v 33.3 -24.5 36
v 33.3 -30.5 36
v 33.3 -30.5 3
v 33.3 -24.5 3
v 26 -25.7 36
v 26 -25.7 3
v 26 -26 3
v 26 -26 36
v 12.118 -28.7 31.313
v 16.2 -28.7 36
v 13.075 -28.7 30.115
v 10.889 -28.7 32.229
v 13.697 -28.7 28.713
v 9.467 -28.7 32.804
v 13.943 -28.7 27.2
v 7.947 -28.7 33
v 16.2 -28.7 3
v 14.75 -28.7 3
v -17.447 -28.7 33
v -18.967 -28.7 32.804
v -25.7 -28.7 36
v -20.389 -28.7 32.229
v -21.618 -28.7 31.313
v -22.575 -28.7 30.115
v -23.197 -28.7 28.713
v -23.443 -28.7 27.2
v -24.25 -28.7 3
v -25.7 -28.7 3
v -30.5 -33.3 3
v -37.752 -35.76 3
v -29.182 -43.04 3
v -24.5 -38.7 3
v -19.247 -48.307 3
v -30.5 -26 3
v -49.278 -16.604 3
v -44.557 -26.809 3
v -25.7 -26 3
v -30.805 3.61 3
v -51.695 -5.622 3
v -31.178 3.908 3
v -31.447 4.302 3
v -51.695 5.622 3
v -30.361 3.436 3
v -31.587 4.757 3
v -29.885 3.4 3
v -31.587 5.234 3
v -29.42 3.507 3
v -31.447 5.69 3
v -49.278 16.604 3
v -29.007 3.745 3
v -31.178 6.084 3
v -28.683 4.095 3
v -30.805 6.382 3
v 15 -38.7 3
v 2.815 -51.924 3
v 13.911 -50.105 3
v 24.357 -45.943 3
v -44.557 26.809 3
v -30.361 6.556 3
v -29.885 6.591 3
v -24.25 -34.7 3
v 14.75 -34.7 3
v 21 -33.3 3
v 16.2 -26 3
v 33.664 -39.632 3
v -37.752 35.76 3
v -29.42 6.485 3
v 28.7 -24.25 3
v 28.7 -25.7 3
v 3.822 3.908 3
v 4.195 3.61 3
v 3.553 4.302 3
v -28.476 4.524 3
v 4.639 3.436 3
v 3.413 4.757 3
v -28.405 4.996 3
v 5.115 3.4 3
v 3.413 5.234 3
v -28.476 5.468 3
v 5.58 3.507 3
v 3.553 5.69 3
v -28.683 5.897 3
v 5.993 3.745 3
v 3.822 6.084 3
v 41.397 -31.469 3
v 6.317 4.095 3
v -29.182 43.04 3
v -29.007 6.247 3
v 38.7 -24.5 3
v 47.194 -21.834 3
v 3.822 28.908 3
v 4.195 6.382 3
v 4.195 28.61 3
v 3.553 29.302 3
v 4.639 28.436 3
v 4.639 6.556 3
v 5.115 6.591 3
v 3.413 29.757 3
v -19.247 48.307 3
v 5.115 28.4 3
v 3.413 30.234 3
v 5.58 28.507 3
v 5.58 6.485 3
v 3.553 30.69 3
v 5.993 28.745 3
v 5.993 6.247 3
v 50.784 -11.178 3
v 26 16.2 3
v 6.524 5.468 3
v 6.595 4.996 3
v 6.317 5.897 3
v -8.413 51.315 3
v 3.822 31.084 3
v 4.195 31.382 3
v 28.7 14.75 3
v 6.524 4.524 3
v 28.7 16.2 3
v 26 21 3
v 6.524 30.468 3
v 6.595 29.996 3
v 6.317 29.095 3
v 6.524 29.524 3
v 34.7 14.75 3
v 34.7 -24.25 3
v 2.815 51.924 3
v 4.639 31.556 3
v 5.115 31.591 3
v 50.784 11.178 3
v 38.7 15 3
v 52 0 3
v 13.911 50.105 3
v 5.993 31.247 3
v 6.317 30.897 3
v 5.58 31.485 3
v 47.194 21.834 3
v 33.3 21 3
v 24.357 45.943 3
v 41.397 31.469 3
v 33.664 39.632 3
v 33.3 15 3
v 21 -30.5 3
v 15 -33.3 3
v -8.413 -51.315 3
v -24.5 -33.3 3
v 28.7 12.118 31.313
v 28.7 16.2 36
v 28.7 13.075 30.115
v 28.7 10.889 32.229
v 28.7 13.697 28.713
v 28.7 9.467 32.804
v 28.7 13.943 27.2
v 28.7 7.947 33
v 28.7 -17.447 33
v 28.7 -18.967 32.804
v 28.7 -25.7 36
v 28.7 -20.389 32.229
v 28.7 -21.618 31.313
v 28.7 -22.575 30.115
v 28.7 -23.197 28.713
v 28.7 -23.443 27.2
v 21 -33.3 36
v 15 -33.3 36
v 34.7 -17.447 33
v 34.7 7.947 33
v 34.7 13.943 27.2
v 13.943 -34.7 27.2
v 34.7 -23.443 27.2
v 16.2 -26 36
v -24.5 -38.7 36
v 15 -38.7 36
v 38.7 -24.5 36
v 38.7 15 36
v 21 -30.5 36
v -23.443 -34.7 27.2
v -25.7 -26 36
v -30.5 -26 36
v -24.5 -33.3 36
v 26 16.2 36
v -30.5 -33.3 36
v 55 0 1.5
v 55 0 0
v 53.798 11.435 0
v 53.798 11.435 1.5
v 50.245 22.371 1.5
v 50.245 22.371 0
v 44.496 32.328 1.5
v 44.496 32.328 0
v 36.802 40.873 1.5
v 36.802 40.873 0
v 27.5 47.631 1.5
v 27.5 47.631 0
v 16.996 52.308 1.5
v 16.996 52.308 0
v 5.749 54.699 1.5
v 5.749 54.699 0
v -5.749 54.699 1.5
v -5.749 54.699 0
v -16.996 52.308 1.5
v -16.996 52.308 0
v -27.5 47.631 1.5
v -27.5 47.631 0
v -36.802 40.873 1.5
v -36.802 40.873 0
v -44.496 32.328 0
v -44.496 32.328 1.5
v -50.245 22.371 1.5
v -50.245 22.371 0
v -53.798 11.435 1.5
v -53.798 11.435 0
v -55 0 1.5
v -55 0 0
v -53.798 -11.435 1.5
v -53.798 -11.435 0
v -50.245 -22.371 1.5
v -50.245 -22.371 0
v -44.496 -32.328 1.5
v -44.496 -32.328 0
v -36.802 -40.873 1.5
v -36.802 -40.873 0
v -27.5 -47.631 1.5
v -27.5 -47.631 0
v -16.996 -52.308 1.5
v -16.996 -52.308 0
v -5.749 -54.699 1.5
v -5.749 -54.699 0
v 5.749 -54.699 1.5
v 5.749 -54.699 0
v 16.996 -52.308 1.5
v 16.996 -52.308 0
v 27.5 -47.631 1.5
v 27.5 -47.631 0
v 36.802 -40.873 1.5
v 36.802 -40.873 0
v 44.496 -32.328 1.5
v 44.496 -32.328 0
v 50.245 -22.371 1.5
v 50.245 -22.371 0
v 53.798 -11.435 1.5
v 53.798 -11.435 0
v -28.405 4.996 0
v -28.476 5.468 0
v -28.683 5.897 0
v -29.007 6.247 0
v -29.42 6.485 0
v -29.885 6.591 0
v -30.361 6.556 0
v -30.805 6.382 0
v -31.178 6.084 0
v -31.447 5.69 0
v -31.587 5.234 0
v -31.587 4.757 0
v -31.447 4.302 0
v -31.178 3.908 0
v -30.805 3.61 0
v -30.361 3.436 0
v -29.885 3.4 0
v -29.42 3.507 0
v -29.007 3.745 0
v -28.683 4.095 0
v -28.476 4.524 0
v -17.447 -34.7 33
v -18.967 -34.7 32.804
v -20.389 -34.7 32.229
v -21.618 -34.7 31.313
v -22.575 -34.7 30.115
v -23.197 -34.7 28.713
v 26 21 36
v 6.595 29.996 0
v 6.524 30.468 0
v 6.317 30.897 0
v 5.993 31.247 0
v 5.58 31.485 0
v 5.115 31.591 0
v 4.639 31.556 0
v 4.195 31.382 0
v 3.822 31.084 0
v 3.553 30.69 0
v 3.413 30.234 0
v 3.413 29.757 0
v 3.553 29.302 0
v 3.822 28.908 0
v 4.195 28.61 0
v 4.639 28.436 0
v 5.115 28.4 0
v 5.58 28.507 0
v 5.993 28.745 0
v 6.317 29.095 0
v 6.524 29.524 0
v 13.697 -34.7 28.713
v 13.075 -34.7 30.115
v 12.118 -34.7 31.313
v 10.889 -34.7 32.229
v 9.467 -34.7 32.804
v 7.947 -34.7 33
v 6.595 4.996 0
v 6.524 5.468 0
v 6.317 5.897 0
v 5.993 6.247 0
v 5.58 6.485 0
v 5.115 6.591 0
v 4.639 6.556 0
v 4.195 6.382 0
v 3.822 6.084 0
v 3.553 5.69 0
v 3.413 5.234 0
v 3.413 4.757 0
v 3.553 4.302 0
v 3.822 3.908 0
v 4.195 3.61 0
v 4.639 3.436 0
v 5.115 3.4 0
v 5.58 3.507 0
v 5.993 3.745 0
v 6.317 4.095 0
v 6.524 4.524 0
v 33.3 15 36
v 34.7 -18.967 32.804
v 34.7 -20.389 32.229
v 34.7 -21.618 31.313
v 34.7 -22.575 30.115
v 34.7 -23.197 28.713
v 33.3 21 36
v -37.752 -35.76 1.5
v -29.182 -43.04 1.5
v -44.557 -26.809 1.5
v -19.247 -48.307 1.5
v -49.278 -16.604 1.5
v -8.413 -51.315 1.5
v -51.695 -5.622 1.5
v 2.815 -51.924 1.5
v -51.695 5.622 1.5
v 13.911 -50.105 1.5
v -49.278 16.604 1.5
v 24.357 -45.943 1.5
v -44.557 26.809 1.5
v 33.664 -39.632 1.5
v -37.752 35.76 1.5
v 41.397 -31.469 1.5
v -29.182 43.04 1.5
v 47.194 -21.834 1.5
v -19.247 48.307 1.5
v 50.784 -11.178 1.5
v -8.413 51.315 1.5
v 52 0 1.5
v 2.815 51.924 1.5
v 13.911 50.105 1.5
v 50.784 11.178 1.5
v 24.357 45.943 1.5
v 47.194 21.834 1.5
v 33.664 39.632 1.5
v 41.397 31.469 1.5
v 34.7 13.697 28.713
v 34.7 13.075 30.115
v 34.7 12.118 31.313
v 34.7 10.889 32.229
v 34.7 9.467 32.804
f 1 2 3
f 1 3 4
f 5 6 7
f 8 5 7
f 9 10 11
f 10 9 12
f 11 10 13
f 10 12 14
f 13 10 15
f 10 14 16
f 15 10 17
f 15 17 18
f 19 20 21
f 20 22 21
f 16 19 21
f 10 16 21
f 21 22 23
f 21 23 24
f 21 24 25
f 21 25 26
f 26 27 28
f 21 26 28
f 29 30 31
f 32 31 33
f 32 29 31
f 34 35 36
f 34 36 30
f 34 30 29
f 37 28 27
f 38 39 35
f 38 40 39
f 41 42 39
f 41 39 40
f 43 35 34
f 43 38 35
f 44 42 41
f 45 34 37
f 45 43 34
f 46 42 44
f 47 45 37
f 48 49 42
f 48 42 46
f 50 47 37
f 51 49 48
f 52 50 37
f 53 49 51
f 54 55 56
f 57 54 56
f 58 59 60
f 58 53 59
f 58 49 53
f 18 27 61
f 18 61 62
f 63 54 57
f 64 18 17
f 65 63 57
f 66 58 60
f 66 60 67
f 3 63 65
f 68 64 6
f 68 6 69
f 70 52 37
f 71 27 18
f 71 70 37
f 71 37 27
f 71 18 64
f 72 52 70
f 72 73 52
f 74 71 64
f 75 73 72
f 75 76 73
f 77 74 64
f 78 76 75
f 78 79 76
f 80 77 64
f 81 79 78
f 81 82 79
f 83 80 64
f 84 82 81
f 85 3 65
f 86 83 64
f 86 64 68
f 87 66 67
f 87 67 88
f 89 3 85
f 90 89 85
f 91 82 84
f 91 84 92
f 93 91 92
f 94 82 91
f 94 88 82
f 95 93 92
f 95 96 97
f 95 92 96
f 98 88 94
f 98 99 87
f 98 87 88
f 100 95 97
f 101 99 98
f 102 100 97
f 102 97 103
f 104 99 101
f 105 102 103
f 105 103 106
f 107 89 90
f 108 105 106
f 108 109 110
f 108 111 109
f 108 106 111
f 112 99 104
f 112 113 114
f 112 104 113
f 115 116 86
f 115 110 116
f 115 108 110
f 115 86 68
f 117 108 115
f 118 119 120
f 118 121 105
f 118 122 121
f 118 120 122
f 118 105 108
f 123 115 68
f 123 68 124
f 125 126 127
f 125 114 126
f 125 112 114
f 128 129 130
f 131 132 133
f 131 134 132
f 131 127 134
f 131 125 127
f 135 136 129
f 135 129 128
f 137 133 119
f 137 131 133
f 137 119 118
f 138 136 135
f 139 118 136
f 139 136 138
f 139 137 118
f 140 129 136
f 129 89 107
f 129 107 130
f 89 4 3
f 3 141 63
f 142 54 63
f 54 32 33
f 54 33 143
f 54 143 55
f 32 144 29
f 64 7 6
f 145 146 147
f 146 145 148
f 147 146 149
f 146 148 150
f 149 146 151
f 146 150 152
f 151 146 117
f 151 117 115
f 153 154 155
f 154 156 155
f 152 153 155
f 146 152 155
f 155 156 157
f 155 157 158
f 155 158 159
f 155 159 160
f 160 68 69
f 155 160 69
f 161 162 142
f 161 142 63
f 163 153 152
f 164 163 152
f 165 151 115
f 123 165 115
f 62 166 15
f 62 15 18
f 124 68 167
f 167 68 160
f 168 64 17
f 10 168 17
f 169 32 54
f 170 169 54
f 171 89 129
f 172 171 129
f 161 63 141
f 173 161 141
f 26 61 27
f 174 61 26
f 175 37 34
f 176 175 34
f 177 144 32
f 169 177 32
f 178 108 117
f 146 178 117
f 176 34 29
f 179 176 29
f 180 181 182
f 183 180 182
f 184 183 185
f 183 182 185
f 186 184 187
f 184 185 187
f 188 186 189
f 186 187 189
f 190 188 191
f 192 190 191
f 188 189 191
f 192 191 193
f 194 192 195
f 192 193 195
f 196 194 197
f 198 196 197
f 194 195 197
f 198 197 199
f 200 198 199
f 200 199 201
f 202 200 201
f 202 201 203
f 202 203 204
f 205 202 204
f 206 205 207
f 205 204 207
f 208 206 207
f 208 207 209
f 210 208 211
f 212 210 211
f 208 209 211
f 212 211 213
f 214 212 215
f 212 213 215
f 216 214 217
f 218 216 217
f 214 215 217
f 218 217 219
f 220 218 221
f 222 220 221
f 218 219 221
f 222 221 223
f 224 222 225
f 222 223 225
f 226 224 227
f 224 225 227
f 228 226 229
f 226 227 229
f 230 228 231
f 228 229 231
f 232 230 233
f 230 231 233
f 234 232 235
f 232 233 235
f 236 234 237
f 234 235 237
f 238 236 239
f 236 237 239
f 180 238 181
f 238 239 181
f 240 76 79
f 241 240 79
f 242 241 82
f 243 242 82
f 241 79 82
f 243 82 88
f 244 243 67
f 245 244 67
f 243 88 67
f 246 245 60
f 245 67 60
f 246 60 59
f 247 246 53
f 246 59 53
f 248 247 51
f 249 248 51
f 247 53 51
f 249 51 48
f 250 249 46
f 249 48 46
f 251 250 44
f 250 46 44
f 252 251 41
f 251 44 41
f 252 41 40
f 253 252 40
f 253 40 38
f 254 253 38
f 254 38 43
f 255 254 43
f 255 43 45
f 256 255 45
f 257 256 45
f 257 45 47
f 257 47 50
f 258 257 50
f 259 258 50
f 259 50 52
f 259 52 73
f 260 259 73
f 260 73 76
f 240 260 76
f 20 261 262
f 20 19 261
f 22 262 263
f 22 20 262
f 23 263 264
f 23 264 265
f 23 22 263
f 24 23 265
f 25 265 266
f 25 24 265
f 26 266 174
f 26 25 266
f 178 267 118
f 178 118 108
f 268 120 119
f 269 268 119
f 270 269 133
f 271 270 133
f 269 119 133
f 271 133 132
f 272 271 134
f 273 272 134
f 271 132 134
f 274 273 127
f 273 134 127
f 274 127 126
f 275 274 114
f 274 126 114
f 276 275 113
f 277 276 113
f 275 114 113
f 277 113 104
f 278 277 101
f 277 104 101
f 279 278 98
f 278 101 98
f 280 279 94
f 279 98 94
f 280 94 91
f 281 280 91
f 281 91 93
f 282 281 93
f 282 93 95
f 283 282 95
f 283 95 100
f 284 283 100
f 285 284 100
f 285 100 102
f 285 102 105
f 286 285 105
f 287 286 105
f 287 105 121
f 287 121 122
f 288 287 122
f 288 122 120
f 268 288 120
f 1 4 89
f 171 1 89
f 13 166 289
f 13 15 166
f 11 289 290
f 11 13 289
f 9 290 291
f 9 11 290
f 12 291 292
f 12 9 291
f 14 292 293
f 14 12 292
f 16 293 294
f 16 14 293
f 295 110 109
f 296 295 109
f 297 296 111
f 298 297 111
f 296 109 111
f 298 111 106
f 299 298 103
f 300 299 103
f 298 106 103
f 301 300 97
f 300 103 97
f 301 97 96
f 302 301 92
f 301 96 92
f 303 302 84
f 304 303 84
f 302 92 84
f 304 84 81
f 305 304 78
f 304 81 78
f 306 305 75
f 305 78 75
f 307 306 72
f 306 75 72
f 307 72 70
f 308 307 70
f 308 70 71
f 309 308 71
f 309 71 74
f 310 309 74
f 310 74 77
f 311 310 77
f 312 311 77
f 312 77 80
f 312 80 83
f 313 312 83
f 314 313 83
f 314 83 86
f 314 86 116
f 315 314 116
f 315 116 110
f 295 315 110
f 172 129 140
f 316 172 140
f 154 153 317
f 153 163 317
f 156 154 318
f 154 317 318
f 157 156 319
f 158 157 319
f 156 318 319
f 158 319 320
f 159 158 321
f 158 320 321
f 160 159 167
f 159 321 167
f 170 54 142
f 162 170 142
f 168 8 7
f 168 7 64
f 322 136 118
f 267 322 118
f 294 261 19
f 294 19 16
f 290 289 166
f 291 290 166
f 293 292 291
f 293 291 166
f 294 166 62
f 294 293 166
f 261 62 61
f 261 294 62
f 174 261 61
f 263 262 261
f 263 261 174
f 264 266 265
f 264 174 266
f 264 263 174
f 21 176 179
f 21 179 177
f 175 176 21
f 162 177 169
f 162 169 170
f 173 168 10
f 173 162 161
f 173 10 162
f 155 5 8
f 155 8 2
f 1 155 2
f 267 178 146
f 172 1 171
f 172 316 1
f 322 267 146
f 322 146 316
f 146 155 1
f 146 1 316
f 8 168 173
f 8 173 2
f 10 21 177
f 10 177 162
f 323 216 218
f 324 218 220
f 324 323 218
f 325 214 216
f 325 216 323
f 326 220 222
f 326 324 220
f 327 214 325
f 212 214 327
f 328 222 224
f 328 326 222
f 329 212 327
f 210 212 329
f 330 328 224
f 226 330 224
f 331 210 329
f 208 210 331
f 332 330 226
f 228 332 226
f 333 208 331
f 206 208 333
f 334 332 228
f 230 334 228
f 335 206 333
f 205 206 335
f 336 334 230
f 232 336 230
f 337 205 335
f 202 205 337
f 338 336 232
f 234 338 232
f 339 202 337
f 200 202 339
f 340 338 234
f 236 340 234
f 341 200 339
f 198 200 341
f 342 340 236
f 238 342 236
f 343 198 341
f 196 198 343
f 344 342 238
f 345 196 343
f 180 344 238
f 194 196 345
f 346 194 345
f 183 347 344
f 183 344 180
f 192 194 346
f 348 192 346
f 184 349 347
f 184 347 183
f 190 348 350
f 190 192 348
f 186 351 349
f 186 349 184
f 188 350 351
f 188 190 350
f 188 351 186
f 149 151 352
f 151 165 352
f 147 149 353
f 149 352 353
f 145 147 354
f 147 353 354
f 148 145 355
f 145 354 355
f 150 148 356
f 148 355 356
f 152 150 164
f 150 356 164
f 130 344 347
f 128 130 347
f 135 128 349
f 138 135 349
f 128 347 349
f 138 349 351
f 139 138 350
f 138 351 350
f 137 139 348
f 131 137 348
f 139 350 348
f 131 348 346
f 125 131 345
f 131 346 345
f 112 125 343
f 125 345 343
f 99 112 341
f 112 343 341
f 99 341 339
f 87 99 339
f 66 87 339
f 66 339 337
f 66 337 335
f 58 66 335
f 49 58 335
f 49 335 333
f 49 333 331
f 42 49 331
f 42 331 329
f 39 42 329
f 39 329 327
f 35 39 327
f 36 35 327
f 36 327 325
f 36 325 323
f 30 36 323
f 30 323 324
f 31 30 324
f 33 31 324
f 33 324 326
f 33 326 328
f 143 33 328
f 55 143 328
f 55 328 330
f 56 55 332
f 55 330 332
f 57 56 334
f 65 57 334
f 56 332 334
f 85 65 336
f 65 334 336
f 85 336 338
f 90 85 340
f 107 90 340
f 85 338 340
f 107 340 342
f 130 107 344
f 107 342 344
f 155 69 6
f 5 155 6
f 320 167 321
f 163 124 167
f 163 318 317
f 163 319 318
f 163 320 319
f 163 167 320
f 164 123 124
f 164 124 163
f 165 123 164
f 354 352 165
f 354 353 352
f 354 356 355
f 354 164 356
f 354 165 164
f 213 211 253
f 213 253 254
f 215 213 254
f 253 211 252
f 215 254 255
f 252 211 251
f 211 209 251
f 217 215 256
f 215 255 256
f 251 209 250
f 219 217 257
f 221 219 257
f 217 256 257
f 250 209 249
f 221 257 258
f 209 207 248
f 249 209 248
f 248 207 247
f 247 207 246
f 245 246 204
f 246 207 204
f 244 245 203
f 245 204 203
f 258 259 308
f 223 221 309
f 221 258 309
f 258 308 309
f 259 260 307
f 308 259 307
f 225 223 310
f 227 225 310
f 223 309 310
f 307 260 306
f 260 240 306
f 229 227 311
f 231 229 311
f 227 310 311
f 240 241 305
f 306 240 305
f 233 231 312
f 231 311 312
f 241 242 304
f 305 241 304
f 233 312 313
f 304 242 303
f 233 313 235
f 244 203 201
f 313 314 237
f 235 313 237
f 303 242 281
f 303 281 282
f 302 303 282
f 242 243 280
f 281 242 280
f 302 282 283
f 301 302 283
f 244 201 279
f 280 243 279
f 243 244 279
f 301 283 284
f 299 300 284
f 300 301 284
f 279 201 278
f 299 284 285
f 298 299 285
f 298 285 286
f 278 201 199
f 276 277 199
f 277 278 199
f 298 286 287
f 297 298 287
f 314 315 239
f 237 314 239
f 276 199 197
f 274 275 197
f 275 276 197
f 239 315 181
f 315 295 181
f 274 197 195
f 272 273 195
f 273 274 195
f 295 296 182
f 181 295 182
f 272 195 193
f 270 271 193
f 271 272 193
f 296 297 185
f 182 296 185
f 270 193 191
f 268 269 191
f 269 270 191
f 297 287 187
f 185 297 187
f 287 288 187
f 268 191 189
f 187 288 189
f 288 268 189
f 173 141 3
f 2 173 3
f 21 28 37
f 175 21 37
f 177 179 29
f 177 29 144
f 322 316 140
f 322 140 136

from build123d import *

# Parameters (mm, degrees)
SKIZZE1_R                       = 52
AUFSATZ_LINEAR_AUSTRAGEN1_DEPTH = 3
SKIZZE1_3_R                     = 55
SKIZZE1_3_R_2                   = 52
AUFSATZ_LINEAR_AUSTRAGEN2_DEPTH = 1.5
SCHNITT_LINEAR_AUSTRAGEN1_REACH = 79.84
SKIZZE3_R                       = 1.6
AUFSATZ_LINEAR_AUSTRAGEN3_DEPTH = 33
SCHNITT_LINEAR_AUSTRAGEN4_REACH = 120.458
SCHNITT_LINEAR_START            = -4
VERRUNDUNG1_R                   = 6
SCHNITT_LINEAR_AUSTRAGEN9_DEPTH = 6
VERRUNDUNG2_R                   = 6


with BuildPart() as part:
    # Skizze1 → Aufsatz-Linear austragen1 (new body)
    with BuildSketch(Plane.XY):
        Circle(SKIZZE1_R)
    extrude(amount=AUFSATZ_LINEAR_AUSTRAGEN1_DEPTH)

    # Skizze1<3> → Aufsatz-Linear austragen2 (add)
    with BuildSketch(Plane.XY):
        Circle(SKIZZE1_3_R)
        Circle(SKIZZE1_3_R_2, mode=Mode.SUBTRACT)
    extrude(amount=AUFSATZ_LINEAR_AUSTRAGEN2_DEPTH)

    # Skizze3 → Schnitt-Linear austragen1 (cut, up to next)
    with BuildSketch(Plane.XY.offset(3), mode=Mode.PRIVATE) as schnitt_linear_austragen1_sk1:
        with Locations((4.995000167, 4.995918163)):
            Circle(SKIZZE3_R)
    schnitt_linear_austragen1_tool1 = extrude(schnitt_linear_austragen1_sk1.sketch, amount=-SCHNITT_LINEAR_AUSTRAGEN1_REACH, mode=Mode.PRIVATE) & part.part
    # Skizze3 → Schnitt-Linear austragen1 (cut, up to next)
    with BuildSketch(Plane.XY.offset(3), mode=Mode.PRIVATE) as schnitt_linear_austragen1_sk2:
        with Locations((4.995000167, 29.995918163)):
            Circle(SKIZZE3_R)
    schnitt_linear_austragen1_tool2 = extrude(schnitt_linear_austragen1_sk2.sketch, amount=-SCHNITT_LINEAR_AUSTRAGEN1_REACH, mode=Mode.PRIVATE) & part.part
    # Skizze3 → Schnitt-Linear austragen1 (cut, up to next)
    with BuildSketch(Plane.XY.offset(3), mode=Mode.PRIVATE) as schnitt_linear_austragen1_sk3:
        with Locations((-30.004999833, 4.995918163)):
            Circle(SKIZZE3_R)
    schnitt_linear_austragen1_tool3 = extrude(schnitt_linear_austragen1_sk3.sketch, amount=-SCHNITT_LINEAR_AUSTRAGEN1_REACH, mode=Mode.PRIVATE) & part.part
    add(schnitt_linear_austragen1_tool1.solids().sort_by_distance((4.995, 4.995918, 3))[0], mode=Mode.SUBTRACT)
    add(schnitt_linear_austragen1_tool2.solids().sort_by_distance((4.995, 29.995918, 3))[0], mode=Mode.SUBTRACT)
    add(schnitt_linear_austragen1_tool3.solids().sort_by_distance((-30.005, 4.995918, 3))[0], mode=Mode.SUBTRACT)

    # Skizze2 → Aufsatz-Linear austragen3 (add)
    with BuildSketch(Plane.XY.offset(3)):
        Polygon((26, 21), (26, 16.2), (27.2, 16.2), (28.7, 16.2), (28.7, 15), (28.7, -24.5), (28.7, -25.7), (27.2, -25.7), (26, -25.7), (26, -26), (21, -26), (16.2, -26), (16.2, -27.2), (16.2, -28.7), (15, -28.7), (-24.5, -28.7), (-25.7, -28.7), (-25.7, -27.2), (-25.7, -26), (-30.5, -26), (-30.5, -33.3), (-24.5, -33.3), (-24.5, -38.7), (15, -38.7), (15, -33.3), (21, -33.3), (21, -30.5), (26, -30.5), (33.3, -30.5), (33.3, -24.5), (38.7, -24.5), (38.7, 15), (33.3, 15), (33.3, 21), align=None)
    extrude(amount=AUFSATZ_LINEAR_AUSTRAGEN3_DEPTH)

    # Skizze6 → Schnitt-Linear austragen4 (cut, up to next)
    with BuildSketch(Plane.XZ.offset(38.7).offset(SCHNITT_LINEAR_START), mode=Mode.PRIVATE) as schnitt_linear_austragen4_sk1:
        Polygon((-24.25, 3), (-23.25, 33), (13.75, 33), (14.75, 3), align=None)
    schnitt_linear_austragen4_tool1 = extrude(schnitt_linear_austragen4_sk1.sketch, amount=-SCHNITT_LINEAR_AUSTRAGEN4_REACH, mode=Mode.PRIVATE) & part.part
    add(schnitt_linear_austragen4_tool1.solids().sort_by_distance((-4.75, -34.7, 17.868421))[0], mode=Mode.SUBTRACT)

    # Verrundung1
    verrundung1_edges = [part.edges().sort_by_distance(p)[0] for p in [
        (-23.25, -31.7, 33),
        (13.75, -31.7, 33),
    ]]
    fillet(verrundung1_edges, radius=VERRUNDUNG1_R)

    # Skizze7 → Schnitt-Linear austragen9 (cut)
    with BuildSketch(Plane.ZY.offset(-28.7)):
        Polygon((33, -23.25), (33, 13.75), (3, 14.75), (3, -24.25), align=None)
    extrude(amount=-SCHNITT_LINEAR_AUSTRAGEN9_DEPTH, mode=Mode.SUBTRACT)

    # Verrundung2
    verrundung2_edges = [part.edges().sort_by_distance(p)[0] for p in [
        (31.7, -23.25, 33),
        (31.7, 13.75, 33),
    ]]
    fillet(verrundung2_edges, radius=VERRUNDUNG2_R)


solid = part.part
